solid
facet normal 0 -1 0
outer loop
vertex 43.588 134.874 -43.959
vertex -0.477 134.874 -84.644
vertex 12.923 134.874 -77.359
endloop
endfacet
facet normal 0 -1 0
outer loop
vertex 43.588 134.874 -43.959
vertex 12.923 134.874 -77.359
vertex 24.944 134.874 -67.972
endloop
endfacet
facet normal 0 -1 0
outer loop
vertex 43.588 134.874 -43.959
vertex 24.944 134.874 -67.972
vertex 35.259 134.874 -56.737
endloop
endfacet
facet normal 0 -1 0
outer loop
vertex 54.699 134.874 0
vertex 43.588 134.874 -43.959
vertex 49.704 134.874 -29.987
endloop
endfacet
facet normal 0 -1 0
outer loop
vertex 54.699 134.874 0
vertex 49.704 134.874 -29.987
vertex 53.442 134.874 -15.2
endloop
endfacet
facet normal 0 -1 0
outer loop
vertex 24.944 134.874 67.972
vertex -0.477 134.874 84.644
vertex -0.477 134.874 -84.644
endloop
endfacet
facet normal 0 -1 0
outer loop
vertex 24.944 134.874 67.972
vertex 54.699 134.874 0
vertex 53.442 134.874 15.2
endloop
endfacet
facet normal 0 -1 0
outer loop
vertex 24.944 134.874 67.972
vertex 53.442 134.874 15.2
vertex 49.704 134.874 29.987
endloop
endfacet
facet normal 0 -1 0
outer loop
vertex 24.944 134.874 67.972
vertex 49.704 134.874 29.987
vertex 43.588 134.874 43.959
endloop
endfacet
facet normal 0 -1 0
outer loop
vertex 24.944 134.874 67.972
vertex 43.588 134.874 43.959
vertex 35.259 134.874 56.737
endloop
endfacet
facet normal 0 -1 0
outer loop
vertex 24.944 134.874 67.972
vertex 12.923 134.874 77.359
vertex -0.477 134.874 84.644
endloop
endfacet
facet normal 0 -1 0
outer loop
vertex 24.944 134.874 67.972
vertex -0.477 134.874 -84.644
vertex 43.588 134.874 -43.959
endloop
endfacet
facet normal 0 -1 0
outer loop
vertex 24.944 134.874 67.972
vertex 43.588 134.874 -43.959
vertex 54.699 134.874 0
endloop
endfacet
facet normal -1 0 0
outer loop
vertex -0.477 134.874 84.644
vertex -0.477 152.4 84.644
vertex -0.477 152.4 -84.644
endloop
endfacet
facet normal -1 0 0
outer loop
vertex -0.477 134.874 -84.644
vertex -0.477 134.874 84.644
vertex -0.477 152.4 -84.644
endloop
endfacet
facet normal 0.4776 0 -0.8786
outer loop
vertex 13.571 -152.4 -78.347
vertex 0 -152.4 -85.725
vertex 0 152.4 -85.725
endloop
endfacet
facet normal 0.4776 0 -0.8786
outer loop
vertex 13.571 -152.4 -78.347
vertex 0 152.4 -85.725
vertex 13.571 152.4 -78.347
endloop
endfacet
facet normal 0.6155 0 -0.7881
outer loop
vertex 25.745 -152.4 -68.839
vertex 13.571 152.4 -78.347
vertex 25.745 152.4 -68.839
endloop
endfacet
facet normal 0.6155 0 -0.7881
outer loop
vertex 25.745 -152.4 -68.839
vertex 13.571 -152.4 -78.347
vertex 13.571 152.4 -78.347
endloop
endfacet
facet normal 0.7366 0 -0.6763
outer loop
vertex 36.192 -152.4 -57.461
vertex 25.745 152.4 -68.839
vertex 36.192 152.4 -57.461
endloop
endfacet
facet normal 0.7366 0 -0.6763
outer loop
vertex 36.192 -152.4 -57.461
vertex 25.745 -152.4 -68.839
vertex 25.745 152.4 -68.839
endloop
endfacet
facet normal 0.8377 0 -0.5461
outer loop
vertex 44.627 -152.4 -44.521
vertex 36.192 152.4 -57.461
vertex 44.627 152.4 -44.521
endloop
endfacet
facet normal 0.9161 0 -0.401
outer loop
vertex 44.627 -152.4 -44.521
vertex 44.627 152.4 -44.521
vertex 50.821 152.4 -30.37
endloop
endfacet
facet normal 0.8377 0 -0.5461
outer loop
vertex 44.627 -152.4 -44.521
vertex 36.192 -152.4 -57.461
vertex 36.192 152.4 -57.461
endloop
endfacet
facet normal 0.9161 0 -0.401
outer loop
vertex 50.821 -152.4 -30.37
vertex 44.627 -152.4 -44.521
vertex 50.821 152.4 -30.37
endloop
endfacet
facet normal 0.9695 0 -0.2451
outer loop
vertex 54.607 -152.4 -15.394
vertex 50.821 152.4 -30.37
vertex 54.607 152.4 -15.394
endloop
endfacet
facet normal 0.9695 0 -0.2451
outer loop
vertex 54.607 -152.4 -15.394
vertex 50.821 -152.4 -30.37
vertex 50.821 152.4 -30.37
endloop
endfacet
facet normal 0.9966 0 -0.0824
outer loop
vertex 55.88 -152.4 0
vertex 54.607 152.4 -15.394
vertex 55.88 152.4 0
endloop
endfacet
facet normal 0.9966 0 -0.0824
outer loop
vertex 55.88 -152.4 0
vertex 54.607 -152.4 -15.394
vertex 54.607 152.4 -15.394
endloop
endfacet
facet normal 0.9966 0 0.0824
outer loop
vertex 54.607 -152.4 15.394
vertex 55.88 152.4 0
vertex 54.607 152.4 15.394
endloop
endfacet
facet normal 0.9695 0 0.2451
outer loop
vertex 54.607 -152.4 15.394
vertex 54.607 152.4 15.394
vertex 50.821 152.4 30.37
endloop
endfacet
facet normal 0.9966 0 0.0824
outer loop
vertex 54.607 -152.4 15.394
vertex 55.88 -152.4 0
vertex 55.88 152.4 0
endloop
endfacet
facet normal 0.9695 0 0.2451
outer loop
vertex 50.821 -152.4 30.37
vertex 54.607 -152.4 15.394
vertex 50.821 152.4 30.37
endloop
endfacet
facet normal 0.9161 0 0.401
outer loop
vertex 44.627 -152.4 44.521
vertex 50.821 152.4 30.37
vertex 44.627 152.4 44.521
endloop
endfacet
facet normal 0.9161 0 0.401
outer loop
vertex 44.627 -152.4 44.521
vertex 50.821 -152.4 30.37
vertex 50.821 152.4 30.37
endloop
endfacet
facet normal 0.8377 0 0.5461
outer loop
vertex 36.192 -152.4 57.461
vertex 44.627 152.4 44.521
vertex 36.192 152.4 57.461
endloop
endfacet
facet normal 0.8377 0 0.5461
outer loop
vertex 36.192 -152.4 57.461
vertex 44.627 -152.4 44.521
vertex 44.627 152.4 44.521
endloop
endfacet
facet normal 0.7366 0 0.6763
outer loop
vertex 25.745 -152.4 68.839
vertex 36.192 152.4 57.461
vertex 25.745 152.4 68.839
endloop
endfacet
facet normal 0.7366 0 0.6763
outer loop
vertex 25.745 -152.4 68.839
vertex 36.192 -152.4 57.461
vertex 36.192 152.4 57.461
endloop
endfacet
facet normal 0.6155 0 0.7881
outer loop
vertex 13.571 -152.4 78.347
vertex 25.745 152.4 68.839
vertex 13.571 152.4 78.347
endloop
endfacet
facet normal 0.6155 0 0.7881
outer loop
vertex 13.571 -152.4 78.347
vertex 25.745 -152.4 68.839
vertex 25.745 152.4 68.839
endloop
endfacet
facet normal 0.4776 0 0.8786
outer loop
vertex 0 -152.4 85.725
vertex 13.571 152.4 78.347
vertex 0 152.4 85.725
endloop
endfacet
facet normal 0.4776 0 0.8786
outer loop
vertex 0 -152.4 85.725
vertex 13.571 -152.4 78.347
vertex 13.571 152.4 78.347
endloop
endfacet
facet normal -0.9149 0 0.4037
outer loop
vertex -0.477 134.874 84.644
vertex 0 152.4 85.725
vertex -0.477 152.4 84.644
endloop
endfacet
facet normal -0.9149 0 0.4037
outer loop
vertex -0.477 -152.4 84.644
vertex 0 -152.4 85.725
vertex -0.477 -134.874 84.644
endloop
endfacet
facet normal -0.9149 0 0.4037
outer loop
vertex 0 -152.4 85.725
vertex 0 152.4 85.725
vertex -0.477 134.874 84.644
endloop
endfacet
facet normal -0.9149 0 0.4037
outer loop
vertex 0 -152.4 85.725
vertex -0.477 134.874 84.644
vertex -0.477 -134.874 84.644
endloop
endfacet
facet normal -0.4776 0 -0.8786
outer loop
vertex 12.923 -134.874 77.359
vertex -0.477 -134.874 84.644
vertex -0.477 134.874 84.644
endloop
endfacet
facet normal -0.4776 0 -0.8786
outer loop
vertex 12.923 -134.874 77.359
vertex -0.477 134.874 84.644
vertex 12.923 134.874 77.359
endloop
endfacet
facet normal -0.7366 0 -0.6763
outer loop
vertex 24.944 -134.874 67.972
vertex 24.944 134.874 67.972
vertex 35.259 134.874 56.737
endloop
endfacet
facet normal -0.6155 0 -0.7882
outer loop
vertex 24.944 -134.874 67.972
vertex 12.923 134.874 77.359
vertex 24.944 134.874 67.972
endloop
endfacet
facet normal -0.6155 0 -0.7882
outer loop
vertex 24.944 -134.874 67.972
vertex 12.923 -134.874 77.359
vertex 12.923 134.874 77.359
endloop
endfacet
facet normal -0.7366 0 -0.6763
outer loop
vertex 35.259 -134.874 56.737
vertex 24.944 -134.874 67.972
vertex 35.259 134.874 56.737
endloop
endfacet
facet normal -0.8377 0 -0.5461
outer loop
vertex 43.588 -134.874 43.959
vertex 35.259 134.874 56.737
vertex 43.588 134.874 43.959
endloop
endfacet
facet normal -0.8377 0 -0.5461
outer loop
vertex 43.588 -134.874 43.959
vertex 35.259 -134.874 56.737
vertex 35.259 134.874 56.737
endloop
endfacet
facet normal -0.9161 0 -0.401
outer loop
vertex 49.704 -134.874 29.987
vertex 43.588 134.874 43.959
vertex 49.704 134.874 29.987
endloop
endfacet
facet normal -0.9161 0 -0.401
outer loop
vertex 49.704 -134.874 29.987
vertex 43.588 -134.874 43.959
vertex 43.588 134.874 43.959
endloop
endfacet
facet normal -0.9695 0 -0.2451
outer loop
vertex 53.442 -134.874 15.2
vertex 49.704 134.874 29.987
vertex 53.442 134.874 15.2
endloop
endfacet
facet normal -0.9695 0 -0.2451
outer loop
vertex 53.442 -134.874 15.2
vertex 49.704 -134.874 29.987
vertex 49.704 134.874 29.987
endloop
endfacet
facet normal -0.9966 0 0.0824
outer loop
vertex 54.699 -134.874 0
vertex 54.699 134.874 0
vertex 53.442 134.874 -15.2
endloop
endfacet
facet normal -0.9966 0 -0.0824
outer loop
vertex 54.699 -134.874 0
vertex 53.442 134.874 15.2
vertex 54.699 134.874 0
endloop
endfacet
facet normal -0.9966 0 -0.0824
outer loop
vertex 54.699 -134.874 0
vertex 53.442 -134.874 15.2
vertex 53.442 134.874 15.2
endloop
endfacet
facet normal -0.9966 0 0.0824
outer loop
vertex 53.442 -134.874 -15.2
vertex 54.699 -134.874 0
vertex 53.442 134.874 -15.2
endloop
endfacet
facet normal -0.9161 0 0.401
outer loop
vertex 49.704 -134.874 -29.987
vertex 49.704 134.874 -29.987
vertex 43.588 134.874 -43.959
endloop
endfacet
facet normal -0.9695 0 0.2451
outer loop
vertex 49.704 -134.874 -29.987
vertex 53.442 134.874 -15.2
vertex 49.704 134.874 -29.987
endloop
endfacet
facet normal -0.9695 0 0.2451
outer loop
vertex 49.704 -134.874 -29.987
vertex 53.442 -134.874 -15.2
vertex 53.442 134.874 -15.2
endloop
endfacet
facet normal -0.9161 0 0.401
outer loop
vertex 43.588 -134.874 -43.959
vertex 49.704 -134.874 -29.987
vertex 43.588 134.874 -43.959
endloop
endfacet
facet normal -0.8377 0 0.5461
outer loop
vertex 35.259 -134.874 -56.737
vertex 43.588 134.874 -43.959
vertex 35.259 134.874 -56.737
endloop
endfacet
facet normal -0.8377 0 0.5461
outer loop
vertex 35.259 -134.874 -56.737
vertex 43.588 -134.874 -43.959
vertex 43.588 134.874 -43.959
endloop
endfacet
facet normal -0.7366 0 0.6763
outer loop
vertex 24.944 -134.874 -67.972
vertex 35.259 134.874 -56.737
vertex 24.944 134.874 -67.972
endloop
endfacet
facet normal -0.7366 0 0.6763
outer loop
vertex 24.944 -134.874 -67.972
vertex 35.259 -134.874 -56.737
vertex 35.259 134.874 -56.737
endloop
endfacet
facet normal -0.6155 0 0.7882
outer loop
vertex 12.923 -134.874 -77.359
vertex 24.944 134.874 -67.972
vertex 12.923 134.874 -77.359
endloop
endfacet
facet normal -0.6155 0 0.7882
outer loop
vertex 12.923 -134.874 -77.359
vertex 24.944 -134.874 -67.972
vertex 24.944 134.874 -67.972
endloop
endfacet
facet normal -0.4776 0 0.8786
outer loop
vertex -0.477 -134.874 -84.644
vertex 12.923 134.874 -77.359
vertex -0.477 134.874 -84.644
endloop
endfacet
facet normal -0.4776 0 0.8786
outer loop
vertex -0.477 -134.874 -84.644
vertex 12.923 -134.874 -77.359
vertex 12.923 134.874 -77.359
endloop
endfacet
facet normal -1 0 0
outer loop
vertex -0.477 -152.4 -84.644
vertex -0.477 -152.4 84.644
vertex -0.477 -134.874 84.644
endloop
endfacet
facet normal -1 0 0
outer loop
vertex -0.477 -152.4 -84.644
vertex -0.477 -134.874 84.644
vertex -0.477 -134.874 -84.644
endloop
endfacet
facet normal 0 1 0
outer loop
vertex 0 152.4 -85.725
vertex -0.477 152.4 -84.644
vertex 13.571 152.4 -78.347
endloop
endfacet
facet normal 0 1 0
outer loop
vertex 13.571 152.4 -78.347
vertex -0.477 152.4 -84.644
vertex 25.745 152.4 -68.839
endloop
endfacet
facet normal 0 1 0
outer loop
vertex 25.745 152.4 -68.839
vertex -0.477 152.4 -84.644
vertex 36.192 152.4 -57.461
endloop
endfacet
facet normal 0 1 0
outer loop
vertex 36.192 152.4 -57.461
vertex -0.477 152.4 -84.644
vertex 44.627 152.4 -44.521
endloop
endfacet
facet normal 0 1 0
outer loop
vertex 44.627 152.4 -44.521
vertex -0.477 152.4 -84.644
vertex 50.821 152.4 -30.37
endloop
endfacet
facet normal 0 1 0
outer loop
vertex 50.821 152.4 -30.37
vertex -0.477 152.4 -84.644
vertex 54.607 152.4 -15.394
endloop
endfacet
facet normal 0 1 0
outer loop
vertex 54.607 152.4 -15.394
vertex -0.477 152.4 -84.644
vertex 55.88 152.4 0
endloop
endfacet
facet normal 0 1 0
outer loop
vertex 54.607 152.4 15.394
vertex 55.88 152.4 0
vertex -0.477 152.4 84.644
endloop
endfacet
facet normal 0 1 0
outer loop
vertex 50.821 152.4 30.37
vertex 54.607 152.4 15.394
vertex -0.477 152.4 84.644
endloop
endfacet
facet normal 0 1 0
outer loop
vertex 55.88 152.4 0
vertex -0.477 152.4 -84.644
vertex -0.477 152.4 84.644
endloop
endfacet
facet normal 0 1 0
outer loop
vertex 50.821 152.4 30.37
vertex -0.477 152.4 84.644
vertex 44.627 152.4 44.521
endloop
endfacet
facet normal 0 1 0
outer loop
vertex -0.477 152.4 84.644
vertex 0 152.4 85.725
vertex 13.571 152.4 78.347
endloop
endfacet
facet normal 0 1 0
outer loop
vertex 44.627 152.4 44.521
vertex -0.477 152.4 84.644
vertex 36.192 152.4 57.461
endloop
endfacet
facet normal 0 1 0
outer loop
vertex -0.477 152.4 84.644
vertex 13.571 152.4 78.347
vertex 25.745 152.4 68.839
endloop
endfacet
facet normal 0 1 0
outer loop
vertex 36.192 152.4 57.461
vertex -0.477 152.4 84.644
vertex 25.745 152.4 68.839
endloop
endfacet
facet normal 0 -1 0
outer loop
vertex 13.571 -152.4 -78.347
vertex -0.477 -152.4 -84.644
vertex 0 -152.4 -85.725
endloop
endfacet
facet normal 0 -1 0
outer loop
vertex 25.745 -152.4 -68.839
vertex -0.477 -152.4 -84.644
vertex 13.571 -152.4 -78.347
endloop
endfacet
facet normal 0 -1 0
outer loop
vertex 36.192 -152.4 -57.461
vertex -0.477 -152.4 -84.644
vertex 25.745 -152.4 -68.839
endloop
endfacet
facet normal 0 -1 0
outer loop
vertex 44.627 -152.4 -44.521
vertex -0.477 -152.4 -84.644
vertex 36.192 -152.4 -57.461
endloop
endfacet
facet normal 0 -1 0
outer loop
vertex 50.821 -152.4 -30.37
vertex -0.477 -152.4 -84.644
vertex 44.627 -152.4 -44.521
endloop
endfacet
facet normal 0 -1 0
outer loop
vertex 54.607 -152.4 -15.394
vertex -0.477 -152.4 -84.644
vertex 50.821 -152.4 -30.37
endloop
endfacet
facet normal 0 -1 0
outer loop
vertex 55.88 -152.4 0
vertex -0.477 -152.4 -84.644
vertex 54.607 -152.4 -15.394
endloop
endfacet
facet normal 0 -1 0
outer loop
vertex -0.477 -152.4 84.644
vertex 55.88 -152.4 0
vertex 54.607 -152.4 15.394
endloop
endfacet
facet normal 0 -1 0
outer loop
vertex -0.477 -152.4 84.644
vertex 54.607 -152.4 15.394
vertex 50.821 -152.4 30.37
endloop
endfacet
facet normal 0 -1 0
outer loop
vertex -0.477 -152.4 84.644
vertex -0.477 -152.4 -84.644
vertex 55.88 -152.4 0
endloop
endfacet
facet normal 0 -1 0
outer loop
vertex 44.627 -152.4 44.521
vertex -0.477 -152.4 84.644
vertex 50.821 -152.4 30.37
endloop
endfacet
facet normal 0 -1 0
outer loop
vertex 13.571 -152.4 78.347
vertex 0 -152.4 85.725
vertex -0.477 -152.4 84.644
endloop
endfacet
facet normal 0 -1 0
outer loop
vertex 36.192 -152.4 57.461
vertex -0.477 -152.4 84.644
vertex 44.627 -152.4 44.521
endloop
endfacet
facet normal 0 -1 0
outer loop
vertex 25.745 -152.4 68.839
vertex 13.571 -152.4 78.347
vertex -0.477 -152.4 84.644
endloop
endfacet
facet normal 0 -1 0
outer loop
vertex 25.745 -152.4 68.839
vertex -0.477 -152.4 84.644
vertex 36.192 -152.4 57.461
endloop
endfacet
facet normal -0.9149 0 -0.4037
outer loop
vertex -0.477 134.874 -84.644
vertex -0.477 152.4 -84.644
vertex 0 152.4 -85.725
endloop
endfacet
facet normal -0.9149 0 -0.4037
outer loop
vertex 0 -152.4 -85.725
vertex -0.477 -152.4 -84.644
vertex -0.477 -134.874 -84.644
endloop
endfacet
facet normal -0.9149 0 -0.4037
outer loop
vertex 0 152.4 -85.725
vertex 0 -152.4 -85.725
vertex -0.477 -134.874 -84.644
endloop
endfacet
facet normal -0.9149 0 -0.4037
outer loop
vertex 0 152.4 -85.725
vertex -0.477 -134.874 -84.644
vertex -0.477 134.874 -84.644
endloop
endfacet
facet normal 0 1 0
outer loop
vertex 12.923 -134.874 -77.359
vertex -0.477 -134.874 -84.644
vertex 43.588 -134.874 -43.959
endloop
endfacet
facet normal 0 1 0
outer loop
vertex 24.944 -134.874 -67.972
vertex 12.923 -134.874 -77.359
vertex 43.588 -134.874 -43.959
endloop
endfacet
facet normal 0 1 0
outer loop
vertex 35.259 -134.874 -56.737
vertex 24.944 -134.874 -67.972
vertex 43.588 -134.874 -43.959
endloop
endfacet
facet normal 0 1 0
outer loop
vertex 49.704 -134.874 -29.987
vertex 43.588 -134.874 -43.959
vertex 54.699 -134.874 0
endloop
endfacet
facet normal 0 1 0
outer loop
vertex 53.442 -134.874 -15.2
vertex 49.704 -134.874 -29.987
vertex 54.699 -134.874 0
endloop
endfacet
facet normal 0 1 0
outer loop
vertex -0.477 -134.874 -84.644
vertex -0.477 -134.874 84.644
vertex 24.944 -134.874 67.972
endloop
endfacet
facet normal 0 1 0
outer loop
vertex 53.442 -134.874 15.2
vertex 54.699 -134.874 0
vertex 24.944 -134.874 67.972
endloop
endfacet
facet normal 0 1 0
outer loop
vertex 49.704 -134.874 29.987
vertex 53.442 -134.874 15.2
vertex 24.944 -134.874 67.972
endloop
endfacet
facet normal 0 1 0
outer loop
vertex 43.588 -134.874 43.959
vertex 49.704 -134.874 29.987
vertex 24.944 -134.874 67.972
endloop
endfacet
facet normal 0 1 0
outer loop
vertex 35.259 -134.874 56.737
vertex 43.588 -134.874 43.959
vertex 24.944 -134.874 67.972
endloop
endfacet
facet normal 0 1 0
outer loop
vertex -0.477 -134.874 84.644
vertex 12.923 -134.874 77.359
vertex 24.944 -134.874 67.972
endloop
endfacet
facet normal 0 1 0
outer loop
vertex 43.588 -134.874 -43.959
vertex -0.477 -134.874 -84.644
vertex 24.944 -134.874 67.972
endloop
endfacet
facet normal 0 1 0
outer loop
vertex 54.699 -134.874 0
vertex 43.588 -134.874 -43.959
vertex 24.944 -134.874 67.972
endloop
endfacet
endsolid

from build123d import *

# Parameters (mm, degrees)
F1_DEPTH = 152.4
F3_DEPTH = 17.526


with BuildPart() as f1:
    # F0 (on Front) → F1 (new body, symmetric)
    with BuildSketch(Plane.XZ):
        with BuildLine():
            Line((-0.476688, -84.644368), (0, -85.725))
            ThreePointArc((0, -85.725), (55.88, 0), (0, 85.725))
            Line((0, 85.725), (-0.476688, 84.644368))
            ThreePointArc((-0.476688, 84.644368), (54.6989, 0), (-0.476688, -84.644368))
        make_face()
    extrude(amount=F1_DEPTH, both=True)

    # F2 (on face) → F3 (join)
    with BuildSketch(Plane.XZ.offset(152.4)):
        with BuildLine():
            Line((-0.476688, 84.644368), (-0.476688, -84.644368))
            ThreePointArc((-0.476688, -84.644368), (54.6989, 0), (-0.476688, 84.644368))
        make_face()
    extrude(amount=-F3_DEPTH)

    # F4: F1 across plane


with BuildPart() as f1_1:
    add(f1.part)
    add(f1.part.mirror(Plane.XZ))


solid = f1_1.part
